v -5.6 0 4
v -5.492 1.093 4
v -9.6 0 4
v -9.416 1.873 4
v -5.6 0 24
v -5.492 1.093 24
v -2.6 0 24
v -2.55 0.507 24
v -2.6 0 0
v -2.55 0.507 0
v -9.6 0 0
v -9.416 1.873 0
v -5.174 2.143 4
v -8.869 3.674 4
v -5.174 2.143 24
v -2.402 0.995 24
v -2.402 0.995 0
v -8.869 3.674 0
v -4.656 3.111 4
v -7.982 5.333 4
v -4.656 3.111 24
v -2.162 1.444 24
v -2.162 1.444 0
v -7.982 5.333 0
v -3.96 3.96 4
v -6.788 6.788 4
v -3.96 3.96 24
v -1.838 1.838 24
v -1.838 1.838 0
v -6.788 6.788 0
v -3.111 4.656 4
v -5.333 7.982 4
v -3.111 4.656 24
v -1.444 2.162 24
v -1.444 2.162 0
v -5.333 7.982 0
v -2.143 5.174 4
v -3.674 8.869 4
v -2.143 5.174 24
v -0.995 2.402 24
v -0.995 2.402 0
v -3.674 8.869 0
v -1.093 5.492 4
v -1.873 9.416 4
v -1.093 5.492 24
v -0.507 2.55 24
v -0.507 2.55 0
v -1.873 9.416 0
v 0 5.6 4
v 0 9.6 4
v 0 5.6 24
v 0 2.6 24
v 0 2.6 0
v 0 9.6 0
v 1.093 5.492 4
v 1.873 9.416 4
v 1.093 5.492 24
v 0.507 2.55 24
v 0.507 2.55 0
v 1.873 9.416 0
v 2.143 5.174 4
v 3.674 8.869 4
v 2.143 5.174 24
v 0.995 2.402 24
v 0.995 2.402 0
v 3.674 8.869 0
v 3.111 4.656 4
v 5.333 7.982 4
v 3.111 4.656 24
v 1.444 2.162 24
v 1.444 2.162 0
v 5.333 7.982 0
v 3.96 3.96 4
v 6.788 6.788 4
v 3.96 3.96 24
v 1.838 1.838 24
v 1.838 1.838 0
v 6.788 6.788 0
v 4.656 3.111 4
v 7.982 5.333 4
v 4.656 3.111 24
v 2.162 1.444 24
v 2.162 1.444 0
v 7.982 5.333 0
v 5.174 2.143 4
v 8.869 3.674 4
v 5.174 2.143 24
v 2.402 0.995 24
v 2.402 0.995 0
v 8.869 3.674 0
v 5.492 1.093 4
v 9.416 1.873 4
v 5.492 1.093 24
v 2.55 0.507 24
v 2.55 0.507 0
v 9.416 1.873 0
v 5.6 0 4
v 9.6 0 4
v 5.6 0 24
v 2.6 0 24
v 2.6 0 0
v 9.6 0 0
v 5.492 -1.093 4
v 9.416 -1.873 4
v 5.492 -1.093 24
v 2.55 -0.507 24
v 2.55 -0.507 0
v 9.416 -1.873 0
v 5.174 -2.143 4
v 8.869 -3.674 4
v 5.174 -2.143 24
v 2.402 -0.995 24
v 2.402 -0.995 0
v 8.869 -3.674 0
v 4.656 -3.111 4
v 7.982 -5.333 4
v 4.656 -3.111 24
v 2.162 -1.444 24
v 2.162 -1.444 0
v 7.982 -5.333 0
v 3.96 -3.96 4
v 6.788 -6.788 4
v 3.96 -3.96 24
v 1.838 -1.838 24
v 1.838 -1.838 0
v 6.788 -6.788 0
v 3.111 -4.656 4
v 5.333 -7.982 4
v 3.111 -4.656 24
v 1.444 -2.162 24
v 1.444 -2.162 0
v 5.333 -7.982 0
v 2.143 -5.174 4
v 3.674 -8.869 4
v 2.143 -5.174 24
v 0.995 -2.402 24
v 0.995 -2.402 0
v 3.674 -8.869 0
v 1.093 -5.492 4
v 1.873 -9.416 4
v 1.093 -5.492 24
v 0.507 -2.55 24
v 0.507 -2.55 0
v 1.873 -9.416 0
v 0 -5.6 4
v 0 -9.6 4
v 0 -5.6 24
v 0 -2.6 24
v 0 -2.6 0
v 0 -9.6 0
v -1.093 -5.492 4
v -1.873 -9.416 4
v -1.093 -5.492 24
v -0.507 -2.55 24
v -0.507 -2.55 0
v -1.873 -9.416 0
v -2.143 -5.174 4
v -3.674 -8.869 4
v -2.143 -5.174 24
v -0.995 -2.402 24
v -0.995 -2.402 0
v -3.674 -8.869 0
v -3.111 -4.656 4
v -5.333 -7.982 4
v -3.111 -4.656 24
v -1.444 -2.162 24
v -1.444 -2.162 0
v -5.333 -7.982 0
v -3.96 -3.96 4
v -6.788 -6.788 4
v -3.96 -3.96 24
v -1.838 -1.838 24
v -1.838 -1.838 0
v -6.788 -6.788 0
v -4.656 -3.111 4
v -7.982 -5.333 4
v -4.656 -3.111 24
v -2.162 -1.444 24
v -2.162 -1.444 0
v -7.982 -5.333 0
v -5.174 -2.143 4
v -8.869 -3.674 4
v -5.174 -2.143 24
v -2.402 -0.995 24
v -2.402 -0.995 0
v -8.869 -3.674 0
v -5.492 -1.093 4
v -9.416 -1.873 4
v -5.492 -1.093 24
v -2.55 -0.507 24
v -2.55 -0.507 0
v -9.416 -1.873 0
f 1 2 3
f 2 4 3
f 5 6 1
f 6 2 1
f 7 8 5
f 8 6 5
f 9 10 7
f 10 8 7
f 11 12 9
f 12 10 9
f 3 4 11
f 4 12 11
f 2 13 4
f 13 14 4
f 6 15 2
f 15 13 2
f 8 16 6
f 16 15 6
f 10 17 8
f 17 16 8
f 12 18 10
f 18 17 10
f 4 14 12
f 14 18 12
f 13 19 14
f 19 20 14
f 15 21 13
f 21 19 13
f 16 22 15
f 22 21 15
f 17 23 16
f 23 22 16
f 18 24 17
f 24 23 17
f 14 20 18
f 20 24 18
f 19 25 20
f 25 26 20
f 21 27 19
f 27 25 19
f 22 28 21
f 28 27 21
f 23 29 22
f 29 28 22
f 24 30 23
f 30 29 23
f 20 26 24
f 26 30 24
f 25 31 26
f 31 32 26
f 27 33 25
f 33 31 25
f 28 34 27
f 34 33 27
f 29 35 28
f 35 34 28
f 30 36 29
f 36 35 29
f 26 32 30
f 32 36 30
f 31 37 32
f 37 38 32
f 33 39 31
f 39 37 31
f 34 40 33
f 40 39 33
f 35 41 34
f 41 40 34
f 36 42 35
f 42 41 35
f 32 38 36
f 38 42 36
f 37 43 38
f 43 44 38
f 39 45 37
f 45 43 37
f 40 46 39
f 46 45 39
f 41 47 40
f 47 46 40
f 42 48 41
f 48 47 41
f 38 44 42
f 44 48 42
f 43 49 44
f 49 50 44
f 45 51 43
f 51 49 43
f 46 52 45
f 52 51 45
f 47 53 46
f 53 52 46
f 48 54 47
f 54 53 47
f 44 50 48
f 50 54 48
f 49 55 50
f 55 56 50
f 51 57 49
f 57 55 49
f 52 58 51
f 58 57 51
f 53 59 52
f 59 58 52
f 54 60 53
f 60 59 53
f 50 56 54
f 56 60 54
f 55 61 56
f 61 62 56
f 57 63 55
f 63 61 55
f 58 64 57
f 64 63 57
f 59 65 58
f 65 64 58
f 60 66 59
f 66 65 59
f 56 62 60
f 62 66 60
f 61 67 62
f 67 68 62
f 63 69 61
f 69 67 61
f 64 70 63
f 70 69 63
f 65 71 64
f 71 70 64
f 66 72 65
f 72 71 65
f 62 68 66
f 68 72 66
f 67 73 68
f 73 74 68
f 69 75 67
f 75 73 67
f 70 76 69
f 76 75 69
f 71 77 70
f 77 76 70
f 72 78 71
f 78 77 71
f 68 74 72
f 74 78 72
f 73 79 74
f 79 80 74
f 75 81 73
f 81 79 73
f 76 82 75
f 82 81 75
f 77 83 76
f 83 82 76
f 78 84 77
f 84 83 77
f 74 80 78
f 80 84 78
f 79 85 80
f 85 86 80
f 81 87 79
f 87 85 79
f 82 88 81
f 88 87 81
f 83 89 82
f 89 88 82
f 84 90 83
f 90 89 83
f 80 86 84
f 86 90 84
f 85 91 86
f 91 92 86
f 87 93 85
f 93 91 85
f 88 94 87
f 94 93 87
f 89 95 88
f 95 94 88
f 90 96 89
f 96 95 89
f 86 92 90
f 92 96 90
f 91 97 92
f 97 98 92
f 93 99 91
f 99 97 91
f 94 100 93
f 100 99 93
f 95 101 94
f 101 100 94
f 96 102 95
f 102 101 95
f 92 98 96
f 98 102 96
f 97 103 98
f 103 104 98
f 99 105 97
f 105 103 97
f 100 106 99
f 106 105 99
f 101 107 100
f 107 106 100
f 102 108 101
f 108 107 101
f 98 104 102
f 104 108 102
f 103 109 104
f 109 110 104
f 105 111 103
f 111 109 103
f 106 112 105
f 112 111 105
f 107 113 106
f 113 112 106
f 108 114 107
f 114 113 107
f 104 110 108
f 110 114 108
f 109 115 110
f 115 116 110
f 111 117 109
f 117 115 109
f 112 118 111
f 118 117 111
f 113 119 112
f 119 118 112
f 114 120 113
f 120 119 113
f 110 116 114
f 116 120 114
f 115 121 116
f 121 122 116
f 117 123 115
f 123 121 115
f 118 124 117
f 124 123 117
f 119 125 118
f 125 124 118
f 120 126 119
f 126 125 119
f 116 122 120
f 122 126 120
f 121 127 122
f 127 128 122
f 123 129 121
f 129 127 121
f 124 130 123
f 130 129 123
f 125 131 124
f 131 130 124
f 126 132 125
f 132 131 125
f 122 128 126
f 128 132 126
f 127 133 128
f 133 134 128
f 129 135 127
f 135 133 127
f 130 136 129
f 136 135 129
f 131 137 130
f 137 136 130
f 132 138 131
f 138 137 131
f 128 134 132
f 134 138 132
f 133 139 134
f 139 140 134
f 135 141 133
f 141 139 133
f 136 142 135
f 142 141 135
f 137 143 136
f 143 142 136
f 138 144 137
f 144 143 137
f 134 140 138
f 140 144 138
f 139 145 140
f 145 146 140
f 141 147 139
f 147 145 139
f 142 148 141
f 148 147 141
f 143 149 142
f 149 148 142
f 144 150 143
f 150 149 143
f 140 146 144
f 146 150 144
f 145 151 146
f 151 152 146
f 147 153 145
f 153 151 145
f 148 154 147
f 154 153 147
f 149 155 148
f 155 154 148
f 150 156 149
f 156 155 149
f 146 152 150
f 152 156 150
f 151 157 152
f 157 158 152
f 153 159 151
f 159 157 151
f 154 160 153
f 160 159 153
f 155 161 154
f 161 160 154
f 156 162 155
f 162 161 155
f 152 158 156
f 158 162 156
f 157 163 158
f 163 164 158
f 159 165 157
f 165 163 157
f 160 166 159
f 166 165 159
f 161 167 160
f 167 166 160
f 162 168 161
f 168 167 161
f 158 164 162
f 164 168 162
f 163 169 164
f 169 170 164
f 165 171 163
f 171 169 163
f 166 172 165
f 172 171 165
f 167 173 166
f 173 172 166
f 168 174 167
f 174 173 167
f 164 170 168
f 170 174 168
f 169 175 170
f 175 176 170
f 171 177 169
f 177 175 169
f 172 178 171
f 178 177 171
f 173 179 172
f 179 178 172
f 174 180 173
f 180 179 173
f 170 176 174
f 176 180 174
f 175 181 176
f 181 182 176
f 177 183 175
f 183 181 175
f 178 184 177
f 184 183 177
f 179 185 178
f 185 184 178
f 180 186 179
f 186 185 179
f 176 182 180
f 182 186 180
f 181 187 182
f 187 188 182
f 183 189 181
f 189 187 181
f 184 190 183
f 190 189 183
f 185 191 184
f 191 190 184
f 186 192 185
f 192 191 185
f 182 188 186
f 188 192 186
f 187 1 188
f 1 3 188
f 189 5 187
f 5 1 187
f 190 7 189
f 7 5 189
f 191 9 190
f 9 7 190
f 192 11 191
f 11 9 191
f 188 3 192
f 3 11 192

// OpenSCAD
$fn = 32;

// ----------------------------------------------------------------------
// Profiled standoff: flanged spacer, 24 mm long, bore 5.2 mm
// ----------------------------------------------------------------------

// --- parameters (mm) ---
revolve_angle = 360;      // full turn around the Z axis
profile_points = 6;       // points of the closed outline

profile = [[2.6, 0], [9.6, 0], [9.6, 4], [5.6, 4], [5.6, 24], [2.6, 24]];  // single closed polygon, 6 points, counter clockwise

// --- the one profile operation ---
rotate_extrude(angle = revolve_angle) polygon(points = profile);
